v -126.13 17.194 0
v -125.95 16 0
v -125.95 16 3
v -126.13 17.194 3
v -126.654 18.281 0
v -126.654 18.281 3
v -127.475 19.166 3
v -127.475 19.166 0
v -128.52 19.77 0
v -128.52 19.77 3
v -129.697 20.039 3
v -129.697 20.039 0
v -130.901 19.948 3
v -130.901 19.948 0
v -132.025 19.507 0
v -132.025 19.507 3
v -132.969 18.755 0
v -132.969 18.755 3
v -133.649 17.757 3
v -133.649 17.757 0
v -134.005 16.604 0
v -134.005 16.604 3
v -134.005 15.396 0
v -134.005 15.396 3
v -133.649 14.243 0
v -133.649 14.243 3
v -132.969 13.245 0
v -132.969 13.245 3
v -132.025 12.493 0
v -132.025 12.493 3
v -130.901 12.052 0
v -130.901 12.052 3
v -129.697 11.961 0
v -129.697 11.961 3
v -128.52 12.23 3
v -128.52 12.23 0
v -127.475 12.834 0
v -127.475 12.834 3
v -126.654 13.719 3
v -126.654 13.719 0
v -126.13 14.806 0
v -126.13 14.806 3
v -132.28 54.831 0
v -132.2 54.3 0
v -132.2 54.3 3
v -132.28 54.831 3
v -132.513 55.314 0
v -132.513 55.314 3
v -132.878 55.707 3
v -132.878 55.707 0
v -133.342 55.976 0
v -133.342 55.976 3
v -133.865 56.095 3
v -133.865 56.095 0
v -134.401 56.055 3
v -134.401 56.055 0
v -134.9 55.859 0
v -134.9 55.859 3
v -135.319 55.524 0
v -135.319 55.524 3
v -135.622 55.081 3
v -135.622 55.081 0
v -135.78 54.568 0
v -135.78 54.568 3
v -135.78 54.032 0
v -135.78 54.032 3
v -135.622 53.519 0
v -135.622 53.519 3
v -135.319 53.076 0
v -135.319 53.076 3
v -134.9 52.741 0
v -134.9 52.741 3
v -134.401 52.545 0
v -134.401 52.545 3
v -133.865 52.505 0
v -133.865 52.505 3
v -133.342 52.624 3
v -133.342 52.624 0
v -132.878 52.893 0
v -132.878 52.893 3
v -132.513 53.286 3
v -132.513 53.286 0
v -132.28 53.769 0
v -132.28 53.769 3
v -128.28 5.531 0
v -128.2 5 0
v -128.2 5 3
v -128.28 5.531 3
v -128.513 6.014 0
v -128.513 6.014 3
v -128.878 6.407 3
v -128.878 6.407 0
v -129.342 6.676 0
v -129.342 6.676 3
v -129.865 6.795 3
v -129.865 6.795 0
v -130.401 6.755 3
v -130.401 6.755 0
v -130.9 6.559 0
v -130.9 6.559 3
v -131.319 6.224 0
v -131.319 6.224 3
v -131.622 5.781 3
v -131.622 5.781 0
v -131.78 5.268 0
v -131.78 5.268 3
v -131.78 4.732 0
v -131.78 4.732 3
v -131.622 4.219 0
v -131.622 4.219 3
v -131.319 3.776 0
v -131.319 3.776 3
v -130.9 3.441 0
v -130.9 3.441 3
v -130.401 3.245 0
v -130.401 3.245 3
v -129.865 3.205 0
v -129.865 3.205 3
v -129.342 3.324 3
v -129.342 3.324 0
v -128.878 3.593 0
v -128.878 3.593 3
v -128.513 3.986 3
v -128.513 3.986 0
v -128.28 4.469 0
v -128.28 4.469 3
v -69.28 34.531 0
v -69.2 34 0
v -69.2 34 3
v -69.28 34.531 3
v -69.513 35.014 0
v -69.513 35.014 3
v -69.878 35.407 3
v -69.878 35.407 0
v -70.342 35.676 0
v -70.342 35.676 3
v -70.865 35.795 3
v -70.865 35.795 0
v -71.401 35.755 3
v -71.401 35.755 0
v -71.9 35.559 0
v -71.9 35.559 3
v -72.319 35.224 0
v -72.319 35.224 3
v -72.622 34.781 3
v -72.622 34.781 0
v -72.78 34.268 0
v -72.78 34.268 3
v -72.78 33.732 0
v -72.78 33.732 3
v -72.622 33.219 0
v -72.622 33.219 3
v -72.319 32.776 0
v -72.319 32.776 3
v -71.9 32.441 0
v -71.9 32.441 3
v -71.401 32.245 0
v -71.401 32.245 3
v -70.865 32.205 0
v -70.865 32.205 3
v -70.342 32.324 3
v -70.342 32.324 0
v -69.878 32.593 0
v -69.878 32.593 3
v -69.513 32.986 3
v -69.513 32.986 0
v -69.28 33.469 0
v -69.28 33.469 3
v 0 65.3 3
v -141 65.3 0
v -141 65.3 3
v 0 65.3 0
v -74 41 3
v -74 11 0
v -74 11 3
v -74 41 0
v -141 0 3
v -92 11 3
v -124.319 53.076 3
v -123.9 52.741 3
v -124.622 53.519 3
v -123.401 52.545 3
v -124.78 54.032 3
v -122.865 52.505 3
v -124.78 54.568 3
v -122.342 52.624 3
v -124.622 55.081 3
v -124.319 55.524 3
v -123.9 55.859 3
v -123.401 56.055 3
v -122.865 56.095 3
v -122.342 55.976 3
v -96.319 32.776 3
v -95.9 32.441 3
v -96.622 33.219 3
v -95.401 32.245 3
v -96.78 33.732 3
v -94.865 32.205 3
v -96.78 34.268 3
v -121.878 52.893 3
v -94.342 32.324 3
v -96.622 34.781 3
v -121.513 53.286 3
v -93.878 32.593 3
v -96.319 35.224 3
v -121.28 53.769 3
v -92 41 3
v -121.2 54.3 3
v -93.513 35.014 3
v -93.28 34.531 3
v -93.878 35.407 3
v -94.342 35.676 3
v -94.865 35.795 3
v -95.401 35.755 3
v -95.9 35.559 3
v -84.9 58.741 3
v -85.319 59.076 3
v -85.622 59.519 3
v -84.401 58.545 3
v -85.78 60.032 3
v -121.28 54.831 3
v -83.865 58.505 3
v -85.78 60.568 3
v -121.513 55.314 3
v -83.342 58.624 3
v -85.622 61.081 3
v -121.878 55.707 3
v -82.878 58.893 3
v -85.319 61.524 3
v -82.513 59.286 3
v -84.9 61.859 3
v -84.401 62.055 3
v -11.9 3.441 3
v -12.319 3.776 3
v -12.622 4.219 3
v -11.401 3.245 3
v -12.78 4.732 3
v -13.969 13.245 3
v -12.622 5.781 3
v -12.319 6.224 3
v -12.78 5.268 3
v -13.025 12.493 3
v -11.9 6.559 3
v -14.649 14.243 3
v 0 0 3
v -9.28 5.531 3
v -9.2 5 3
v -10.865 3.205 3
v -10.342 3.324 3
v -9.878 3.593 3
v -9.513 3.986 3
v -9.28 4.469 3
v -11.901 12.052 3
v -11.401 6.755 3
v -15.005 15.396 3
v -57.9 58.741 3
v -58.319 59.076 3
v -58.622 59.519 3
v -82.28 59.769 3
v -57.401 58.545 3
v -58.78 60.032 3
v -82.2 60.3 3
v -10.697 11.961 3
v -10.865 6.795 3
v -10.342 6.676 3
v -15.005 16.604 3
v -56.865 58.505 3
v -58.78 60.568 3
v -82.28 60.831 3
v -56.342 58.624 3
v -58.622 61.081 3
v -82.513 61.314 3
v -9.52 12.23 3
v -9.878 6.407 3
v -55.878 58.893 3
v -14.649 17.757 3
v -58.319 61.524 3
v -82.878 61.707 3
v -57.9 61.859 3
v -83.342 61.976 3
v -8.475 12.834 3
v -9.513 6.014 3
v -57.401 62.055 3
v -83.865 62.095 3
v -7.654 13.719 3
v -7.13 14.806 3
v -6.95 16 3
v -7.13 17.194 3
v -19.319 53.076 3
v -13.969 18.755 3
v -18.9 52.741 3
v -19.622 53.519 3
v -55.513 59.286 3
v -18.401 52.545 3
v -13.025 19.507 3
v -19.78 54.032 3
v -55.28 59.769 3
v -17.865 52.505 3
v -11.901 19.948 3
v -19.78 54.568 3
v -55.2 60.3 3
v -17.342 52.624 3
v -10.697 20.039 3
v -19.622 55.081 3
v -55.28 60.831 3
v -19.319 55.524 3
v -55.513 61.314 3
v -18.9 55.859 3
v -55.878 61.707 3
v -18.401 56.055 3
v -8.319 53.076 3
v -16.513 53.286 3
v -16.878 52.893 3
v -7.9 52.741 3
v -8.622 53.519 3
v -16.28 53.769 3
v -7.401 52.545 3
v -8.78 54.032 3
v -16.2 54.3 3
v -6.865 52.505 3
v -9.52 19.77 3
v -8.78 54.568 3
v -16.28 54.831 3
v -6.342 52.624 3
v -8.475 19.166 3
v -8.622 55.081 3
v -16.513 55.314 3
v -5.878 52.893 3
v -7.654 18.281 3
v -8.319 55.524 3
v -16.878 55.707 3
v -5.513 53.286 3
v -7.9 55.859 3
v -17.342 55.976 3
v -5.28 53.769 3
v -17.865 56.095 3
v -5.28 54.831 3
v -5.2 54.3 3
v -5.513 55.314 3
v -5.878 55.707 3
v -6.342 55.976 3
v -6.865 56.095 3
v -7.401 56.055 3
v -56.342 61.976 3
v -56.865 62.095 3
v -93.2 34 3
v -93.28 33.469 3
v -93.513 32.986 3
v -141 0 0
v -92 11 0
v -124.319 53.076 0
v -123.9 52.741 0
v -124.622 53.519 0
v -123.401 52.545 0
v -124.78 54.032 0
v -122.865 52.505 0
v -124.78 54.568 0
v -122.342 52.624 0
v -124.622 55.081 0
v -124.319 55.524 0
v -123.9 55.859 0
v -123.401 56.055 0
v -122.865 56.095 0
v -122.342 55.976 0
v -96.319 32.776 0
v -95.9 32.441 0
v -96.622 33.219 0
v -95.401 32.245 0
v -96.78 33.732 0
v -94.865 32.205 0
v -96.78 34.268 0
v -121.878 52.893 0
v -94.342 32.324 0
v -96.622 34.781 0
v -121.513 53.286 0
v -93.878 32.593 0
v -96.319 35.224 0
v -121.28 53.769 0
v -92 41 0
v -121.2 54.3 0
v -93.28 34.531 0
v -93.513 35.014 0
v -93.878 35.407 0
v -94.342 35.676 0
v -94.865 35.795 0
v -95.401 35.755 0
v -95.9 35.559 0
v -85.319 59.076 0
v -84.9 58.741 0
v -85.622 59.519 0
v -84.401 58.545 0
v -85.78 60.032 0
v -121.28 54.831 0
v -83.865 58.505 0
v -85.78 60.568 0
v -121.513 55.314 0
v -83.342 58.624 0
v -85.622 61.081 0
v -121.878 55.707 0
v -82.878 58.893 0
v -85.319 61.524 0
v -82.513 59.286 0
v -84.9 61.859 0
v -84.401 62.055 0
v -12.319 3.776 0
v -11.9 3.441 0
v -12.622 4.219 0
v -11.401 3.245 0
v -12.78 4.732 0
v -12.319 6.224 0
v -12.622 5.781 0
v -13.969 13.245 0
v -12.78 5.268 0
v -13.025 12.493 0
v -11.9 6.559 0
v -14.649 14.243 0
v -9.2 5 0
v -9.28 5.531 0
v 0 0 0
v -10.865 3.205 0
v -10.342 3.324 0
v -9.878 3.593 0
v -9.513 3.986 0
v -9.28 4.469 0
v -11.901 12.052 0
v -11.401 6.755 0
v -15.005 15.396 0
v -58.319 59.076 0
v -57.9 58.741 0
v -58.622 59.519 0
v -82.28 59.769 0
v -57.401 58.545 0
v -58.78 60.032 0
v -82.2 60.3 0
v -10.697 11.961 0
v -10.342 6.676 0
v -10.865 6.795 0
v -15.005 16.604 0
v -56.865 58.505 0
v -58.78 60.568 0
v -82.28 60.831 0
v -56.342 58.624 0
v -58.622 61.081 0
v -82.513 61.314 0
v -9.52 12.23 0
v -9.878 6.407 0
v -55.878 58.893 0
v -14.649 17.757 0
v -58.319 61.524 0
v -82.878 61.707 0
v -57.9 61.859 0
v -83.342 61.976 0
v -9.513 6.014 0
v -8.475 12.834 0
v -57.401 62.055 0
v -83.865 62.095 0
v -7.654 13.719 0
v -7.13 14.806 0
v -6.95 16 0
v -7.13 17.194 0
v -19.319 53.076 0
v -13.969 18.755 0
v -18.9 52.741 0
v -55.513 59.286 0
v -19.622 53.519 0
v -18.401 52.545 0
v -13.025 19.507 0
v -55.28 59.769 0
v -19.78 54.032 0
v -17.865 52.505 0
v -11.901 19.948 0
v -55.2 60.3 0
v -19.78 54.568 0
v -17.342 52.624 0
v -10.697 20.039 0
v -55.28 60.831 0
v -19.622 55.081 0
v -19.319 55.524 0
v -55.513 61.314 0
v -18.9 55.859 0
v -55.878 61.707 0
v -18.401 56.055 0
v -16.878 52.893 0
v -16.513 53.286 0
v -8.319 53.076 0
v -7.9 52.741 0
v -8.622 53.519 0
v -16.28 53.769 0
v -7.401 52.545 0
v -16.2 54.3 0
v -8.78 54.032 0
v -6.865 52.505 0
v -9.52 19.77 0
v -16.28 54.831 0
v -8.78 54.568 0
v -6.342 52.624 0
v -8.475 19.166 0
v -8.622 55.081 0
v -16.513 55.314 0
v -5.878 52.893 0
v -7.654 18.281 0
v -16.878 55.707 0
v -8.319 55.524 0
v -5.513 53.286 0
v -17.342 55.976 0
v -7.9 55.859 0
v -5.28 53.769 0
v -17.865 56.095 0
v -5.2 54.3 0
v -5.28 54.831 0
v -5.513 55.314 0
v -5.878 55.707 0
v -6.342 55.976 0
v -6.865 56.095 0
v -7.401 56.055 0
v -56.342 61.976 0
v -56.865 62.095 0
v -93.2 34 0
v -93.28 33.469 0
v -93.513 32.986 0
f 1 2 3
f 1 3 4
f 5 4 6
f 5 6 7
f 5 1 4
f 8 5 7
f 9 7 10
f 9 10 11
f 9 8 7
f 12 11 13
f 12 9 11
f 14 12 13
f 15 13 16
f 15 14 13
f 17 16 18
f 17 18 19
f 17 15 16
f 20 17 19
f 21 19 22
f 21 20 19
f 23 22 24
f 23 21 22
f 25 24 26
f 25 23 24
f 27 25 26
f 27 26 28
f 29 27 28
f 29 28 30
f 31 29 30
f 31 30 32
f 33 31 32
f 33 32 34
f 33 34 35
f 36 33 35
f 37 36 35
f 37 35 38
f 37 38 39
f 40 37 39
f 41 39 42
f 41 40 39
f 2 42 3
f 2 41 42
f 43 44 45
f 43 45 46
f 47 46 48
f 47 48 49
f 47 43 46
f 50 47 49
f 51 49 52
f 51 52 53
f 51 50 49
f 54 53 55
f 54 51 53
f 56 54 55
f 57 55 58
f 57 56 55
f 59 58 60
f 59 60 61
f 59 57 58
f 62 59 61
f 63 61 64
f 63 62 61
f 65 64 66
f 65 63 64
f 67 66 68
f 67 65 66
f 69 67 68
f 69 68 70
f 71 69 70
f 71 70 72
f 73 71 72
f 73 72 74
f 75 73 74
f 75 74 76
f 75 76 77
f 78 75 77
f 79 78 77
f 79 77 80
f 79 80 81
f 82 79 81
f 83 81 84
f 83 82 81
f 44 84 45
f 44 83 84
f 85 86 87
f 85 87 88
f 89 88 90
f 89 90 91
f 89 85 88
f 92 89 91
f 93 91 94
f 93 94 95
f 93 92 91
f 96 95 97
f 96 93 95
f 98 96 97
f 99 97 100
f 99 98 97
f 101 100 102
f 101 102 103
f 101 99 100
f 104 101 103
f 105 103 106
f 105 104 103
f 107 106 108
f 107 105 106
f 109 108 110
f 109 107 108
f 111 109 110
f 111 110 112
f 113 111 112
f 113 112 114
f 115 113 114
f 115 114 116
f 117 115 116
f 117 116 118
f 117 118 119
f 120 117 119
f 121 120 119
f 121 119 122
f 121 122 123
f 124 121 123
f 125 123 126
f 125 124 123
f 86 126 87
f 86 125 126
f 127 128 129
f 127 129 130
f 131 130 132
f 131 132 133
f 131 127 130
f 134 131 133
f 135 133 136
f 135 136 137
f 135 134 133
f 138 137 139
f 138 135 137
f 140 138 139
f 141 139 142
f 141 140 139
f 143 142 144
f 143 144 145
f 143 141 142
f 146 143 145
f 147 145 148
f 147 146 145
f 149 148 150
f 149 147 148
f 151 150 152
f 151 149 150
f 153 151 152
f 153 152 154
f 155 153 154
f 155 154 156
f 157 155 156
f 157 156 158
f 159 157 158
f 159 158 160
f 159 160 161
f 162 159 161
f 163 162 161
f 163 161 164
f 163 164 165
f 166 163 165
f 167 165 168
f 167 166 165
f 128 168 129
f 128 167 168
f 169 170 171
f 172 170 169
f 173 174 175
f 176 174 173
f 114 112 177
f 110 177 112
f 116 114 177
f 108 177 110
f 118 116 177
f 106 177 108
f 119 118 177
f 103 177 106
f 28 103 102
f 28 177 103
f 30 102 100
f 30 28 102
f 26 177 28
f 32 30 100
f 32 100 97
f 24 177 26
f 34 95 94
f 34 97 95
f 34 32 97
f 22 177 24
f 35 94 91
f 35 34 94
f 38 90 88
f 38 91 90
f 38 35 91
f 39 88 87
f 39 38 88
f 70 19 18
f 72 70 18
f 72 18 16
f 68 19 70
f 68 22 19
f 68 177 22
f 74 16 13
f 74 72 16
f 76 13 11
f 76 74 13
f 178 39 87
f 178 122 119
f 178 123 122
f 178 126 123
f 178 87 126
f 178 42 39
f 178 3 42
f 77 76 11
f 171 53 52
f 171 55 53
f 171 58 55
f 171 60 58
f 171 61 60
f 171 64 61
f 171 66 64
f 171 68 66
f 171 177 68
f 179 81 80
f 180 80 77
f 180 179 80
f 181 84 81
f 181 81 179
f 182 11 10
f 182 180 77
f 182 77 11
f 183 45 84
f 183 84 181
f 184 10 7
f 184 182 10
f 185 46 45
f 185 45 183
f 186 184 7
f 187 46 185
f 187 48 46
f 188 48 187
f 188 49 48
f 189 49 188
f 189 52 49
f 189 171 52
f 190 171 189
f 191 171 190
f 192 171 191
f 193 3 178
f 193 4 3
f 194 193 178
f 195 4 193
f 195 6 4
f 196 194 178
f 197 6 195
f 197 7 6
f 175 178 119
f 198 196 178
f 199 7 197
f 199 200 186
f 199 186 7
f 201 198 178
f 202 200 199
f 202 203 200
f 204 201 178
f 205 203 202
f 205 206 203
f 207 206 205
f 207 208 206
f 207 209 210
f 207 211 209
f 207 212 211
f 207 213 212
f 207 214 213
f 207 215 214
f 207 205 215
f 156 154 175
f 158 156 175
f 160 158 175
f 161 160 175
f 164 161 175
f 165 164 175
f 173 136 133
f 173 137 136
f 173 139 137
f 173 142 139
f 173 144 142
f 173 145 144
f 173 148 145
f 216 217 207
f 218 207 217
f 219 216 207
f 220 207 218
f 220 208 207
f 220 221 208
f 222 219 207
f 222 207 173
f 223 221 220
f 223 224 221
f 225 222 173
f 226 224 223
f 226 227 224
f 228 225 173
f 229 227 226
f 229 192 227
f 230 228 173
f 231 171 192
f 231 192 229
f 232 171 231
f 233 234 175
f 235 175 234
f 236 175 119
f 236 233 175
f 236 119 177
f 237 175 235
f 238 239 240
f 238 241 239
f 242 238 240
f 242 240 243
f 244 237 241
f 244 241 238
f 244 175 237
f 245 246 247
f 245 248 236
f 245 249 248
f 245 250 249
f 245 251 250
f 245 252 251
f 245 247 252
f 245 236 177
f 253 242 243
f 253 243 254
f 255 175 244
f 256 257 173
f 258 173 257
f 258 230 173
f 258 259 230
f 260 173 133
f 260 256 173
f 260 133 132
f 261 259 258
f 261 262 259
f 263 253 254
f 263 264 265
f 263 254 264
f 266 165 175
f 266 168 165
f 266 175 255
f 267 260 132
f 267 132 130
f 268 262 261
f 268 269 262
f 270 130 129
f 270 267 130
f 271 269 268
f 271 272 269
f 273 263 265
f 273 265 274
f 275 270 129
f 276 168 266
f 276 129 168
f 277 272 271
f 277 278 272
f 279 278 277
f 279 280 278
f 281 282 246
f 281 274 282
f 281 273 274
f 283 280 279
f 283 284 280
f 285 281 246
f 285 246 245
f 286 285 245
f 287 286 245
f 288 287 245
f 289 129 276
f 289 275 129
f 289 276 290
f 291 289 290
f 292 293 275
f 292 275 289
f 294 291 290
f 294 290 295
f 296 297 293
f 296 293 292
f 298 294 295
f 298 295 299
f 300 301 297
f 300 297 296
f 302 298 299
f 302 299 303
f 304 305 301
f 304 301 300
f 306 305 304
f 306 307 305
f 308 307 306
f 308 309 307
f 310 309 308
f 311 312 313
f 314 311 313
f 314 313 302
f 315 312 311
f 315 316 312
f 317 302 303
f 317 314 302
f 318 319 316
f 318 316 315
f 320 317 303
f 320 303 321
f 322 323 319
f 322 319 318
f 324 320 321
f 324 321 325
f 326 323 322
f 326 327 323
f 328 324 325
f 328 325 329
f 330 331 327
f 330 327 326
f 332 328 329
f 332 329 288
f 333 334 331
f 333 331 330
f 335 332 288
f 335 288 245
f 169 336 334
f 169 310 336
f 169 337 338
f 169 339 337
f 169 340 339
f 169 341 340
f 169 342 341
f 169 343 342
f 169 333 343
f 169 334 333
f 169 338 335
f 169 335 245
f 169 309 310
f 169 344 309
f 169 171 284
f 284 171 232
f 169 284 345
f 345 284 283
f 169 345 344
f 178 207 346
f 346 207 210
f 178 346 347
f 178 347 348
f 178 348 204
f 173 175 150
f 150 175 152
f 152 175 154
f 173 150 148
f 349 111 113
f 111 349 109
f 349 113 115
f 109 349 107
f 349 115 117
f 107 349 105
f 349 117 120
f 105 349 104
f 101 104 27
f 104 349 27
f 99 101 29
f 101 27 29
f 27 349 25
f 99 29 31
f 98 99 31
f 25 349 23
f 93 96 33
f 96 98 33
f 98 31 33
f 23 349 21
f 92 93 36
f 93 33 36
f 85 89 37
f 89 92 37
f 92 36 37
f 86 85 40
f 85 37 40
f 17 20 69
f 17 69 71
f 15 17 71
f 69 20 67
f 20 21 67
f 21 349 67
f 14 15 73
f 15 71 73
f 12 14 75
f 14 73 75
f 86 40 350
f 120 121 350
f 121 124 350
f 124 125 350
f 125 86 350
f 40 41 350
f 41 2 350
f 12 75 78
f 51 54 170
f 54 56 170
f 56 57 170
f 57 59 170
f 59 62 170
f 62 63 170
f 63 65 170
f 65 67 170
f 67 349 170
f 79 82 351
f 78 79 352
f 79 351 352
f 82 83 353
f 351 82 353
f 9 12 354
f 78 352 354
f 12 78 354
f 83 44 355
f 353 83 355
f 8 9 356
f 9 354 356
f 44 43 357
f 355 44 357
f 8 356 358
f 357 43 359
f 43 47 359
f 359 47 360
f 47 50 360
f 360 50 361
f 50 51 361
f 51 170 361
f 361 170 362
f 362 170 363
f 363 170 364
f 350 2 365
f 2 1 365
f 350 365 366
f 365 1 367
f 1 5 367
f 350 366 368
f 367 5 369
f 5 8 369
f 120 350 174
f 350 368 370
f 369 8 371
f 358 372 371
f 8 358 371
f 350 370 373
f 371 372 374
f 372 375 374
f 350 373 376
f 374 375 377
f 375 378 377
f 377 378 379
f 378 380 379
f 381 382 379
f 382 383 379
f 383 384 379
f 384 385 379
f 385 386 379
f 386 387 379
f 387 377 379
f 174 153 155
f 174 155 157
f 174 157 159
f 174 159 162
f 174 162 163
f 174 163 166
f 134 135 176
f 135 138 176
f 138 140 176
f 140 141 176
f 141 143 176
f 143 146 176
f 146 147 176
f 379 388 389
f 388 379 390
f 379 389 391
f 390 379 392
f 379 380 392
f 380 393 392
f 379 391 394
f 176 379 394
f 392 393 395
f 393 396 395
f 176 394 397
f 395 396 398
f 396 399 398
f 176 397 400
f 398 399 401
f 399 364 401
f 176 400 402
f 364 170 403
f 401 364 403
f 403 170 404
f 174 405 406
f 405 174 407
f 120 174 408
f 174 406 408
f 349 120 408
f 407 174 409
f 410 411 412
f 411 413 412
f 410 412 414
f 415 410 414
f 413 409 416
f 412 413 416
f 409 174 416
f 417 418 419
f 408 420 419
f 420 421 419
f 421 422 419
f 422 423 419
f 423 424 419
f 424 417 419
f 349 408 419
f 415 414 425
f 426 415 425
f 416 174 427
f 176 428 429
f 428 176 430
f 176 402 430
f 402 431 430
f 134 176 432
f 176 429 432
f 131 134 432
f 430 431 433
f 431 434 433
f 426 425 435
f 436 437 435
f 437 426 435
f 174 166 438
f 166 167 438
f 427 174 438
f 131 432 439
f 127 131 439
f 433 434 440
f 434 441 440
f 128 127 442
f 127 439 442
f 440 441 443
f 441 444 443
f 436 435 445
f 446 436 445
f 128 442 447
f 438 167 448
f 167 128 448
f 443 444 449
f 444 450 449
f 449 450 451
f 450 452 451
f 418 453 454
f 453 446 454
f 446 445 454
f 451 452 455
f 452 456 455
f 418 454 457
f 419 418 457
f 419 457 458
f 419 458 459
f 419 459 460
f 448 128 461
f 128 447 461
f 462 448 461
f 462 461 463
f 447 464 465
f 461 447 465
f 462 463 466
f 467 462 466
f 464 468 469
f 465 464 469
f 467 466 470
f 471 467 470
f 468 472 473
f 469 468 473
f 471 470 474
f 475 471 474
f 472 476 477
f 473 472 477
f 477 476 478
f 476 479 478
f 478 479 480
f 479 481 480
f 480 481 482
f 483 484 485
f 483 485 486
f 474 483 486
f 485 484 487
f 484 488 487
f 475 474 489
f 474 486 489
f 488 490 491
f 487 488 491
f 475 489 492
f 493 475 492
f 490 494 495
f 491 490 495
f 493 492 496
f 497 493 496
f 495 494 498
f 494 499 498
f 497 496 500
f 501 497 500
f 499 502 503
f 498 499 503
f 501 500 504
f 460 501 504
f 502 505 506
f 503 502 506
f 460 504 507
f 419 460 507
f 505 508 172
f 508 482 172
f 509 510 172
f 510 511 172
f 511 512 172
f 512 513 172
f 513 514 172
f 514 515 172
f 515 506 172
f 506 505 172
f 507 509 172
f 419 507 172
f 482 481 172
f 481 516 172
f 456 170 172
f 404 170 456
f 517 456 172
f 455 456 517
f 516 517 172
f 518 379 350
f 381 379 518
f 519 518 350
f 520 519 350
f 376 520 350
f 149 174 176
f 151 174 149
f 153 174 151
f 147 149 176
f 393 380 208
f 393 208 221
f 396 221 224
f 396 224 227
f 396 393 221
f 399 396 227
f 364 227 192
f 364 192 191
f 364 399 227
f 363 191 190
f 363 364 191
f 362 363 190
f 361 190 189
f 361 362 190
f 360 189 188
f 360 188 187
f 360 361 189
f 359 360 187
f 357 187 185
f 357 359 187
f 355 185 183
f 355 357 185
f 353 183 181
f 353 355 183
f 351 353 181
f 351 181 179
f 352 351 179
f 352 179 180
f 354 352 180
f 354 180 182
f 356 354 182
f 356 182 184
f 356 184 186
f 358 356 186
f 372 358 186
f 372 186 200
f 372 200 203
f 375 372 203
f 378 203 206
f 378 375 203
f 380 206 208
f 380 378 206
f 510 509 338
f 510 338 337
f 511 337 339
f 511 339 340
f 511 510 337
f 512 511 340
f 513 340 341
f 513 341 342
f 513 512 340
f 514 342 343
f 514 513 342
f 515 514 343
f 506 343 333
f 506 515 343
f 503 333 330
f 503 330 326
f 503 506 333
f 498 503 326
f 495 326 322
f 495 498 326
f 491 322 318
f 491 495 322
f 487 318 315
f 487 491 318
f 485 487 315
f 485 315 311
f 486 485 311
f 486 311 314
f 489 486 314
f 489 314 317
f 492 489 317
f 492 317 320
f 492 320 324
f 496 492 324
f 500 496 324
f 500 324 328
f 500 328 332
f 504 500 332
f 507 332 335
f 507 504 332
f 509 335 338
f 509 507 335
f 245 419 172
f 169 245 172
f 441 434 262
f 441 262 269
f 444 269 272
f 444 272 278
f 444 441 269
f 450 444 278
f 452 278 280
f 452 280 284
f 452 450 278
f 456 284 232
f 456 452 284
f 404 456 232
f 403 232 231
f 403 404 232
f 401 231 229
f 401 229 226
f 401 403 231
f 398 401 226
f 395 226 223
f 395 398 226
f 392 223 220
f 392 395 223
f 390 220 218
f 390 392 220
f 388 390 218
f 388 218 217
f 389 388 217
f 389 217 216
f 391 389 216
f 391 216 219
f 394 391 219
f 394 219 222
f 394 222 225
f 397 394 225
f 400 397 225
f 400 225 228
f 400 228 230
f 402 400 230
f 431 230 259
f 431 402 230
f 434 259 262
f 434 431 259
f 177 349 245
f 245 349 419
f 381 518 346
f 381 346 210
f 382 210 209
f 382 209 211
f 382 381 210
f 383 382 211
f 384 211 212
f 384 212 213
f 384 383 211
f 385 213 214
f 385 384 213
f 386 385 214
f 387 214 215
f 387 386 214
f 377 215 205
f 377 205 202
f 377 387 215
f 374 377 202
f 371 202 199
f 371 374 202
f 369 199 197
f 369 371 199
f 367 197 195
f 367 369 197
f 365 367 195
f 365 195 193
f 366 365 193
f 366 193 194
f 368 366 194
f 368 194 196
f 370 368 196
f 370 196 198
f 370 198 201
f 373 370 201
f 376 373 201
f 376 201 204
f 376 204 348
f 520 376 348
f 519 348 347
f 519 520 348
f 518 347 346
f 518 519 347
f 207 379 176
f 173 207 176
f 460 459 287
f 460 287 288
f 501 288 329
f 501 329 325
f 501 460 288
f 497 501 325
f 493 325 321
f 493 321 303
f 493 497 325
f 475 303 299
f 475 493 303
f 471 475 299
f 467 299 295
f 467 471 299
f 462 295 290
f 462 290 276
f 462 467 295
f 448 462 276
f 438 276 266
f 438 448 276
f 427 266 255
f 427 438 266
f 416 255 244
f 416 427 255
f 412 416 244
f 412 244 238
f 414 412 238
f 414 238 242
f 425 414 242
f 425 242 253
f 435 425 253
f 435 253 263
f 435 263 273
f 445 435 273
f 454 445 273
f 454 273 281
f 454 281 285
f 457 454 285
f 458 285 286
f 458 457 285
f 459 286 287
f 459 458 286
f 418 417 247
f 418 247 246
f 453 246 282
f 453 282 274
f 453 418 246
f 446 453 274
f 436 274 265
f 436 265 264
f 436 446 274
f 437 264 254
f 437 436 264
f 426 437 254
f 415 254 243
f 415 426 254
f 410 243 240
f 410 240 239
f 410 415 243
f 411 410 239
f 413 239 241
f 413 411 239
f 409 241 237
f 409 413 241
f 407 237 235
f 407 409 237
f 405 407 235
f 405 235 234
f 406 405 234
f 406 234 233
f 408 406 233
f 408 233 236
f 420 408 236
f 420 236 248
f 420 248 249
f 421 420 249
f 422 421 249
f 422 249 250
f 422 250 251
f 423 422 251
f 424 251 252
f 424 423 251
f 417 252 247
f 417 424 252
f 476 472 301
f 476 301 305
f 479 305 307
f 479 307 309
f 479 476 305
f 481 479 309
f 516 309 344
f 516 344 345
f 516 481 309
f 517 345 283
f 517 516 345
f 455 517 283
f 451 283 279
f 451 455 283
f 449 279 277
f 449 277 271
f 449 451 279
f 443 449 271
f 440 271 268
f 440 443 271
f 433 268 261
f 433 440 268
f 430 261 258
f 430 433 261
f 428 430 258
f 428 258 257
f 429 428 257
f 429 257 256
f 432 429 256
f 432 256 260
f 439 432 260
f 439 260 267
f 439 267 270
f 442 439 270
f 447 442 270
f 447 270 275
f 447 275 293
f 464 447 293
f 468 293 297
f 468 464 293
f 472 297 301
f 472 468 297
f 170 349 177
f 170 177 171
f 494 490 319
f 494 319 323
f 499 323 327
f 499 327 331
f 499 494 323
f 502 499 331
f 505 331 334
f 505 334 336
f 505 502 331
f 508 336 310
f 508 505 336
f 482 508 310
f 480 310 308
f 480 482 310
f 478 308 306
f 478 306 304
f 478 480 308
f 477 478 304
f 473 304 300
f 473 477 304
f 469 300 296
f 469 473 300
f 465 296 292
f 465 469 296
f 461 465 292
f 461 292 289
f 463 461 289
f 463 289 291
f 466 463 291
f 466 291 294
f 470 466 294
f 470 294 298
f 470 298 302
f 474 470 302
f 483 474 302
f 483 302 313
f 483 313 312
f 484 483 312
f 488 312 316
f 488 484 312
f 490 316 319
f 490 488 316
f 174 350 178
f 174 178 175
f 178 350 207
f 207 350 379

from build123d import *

# Parameters (mm, degrees)
SKETCH_W   = 141
SKETCH_H   = 65.3
SKETCH_R   = 4.05
SKETCH_R_2 = 1.8
SKETCH_W_2 = 18
SKETCH_H_2 = 30
PAD_DEPTH  = 3


with BuildPart() as part:
    # Sketch → Pad (new body)
    with BuildSketch(Plane.XY):
        with Locations((-70.5, 32.65)):
            Rectangle(SKETCH_W, SKETCH_H)
        with Locations((-130, 16)):
            Circle(SKETCH_R, mode=Mode.SUBTRACT)
        with Locations((-11, 16)):
            Circle(SKETCH_R, mode=Mode.SUBTRACT)
        with Locations((-134, 54.3)):
            Circle(SKETCH_R_2, mode=Mode.SUBTRACT)
        with Locations((-123, 54.3)):
            Circle(SKETCH_R_2, mode=Mode.SUBTRACT)
        with Locations((-18, 54.3)):
            Circle(SKETCH_R_2, mode=Mode.SUBTRACT)
        with Locations((-7, 54.3)):
            Circle(SKETCH_R_2, mode=Mode.SUBTRACT)
        with Locations((-84, 60.3)):
            Circle(SKETCH_R_2, mode=Mode.SUBTRACT)
        with Locations((-57, 60.3)):
            Circle(SKETCH_R_2, mode=Mode.SUBTRACT)
        with Locations((-95, 34)):
            Circle(SKETCH_R_2, mode=Mode.SUBTRACT)
        with Locations((-71, 34)):
            Circle(SKETCH_R_2, mode=Mode.SUBTRACT)
        with Locations((-130, 5)):
            Circle(SKETCH_R_2, mode=Mode.SUBTRACT)
        with Locations((-11, 5)):
            Circle(SKETCH_R_2, mode=Mode.SUBTRACT)
        with Locations((-83, 26)):
            Rectangle(SKETCH_W_2, SKETCH_H_2, mode=Mode.SUBTRACT)
    extrude(amount=PAD_DEPTH)


solid = part.part
